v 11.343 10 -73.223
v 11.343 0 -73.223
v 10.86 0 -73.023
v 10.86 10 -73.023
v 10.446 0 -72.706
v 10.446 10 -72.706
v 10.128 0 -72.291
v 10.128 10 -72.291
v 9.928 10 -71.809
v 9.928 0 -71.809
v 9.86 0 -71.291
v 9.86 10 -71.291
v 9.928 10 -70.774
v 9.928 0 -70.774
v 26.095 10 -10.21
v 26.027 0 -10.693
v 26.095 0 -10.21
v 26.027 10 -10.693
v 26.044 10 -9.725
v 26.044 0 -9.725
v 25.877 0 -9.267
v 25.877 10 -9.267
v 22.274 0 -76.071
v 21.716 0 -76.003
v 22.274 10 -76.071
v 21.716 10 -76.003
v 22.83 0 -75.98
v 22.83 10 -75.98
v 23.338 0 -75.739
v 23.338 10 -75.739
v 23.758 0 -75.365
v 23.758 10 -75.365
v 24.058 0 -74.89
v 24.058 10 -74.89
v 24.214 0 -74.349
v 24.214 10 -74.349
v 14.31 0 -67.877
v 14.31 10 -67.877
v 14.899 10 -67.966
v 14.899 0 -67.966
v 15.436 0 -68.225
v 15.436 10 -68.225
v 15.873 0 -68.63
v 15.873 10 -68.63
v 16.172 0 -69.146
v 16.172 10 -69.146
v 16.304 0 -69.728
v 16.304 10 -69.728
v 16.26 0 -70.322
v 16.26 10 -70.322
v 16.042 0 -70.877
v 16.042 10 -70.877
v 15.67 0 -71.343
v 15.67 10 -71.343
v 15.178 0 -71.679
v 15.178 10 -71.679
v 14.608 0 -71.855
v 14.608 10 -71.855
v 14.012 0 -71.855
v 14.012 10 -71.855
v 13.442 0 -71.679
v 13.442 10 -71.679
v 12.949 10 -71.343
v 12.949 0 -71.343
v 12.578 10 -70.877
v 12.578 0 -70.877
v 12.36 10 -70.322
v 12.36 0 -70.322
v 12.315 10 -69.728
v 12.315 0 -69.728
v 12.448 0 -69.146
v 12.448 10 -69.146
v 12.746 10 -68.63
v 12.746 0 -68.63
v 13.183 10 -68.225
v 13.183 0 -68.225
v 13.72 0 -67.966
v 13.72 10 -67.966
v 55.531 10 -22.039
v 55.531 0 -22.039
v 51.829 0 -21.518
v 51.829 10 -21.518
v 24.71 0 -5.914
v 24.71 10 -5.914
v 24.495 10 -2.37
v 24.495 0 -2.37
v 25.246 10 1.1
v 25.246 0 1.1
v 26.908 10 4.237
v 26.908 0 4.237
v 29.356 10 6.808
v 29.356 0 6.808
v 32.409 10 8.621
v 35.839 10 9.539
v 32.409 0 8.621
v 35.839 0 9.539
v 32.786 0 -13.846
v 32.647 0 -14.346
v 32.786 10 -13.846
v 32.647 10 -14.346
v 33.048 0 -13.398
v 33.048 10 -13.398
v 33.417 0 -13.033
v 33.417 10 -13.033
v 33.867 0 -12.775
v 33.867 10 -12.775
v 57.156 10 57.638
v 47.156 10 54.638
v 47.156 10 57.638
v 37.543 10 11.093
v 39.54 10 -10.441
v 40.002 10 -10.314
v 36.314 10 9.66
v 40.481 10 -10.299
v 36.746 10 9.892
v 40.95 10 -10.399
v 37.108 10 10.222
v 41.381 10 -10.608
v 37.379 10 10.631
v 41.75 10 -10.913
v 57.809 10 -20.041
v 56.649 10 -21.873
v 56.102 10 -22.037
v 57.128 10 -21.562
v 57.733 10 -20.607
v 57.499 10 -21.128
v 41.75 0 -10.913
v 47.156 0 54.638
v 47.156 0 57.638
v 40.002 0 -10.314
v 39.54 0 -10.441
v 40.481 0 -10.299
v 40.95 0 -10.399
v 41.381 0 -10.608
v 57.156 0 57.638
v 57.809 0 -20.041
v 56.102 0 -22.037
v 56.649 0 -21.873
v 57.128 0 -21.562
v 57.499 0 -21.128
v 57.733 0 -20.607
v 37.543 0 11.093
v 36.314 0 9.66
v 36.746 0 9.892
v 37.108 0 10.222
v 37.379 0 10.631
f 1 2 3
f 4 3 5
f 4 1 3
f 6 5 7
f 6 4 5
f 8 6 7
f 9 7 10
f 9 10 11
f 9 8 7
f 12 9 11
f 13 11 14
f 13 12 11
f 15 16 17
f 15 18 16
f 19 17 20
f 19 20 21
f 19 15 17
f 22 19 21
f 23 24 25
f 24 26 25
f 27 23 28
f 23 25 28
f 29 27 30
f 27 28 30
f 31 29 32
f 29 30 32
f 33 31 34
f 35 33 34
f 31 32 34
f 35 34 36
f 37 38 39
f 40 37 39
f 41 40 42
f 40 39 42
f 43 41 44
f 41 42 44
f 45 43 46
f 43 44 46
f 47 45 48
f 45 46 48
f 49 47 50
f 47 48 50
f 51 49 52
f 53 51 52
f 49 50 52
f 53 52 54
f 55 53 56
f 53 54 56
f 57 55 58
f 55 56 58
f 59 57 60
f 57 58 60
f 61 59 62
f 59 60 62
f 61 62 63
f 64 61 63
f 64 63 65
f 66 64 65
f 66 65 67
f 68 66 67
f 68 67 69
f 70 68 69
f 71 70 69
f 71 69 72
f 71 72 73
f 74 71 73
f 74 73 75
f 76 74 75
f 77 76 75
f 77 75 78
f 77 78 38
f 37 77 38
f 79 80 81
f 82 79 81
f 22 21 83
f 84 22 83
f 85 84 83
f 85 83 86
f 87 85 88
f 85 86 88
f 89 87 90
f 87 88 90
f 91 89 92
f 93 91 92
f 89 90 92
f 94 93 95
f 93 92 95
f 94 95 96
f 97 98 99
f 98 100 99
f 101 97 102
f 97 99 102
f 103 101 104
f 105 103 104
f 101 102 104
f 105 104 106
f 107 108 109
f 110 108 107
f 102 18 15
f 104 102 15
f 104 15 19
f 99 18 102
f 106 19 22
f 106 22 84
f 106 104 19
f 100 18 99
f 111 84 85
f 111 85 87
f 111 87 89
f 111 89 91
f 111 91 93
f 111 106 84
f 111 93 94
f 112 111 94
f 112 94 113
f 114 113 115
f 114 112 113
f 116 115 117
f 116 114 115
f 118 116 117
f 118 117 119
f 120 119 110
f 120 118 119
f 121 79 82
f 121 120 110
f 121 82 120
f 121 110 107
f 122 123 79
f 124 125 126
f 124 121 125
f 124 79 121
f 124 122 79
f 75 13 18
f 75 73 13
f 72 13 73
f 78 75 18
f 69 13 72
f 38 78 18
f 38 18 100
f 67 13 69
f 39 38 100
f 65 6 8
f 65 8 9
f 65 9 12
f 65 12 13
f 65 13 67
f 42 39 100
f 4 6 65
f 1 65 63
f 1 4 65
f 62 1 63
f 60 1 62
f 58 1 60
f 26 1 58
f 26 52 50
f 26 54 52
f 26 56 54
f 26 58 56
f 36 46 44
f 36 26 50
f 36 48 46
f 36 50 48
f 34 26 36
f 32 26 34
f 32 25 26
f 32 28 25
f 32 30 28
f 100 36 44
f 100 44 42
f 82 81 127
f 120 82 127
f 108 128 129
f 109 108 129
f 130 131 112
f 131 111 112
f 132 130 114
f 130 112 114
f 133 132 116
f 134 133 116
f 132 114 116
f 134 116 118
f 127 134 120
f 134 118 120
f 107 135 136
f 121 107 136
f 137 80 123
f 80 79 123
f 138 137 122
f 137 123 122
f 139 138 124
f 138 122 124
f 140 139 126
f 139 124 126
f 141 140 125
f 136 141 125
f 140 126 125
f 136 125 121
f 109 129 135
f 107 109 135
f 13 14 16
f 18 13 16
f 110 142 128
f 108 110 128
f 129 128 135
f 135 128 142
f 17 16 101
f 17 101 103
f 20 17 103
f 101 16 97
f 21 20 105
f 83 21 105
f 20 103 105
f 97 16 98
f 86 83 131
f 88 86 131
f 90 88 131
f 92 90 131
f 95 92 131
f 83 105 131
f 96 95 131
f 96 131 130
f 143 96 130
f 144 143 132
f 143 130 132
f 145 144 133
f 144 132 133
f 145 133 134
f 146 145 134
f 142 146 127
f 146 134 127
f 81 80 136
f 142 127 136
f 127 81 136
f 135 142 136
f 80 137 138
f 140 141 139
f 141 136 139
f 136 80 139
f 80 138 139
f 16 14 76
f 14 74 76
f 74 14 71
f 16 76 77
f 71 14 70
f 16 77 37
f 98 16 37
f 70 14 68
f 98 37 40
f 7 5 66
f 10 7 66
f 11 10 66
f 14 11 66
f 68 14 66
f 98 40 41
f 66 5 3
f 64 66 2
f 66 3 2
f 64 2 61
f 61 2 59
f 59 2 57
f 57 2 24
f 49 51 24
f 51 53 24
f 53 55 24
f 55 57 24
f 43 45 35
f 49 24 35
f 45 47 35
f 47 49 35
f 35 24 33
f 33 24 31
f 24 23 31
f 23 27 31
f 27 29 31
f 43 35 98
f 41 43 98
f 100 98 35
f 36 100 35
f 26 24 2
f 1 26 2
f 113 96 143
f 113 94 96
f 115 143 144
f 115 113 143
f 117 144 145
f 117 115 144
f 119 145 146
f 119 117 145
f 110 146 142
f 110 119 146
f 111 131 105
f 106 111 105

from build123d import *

# Parameters (mm, degrees)
BOSS_EXTRUDE1_DEPTH = 10
SKETCH2_R           = 2
CUT_EXTRUDE1_DEPTH  = 97.487793931
FILLET1_R           = 2


with BuildPart() as part:
    # Sketch1 → Boss-Extrude1 (new body)
    with BuildSketch(Plane(origin=(0, 0, 0), x_dir=(1, 0, 0), z_dir=(0, 1, 0))):
        with BuildLine():
            Line((23.899700969, 76.587880496), (9.410813575, 72.70559482))
            Line((9.410813575, 72.70559482), (26.234051507, 9.920416111))
            ThreePointArc((26.234051507, 9.920416111), (26.122890324, -3.007620786), (37.221477465, -9.638447153))
            Line((37.221477465, -9.638447153), (47.155900716, -54.638447153))
            Line((47.155900716, -54.638447153), (47.155900716, -57.638447153))
            Line((47.155900716, -57.638447153), (57.155900716, -57.638447153))
            Line((57.155900716, -57.638447153), (57.828980094, 22.361552847))
            Line((57.828980094, 22.361552847), (51.828980094, 21.518307839))
            Line((51.828980094, 21.518307839), (40.806779431, 9.920416111))
            Line((40.806779431, 9.920416111), (32.806779431, 13.210724097))
            Line((32.806779431, 13.210724097), (23.899700969, 76.587880496))
        make_face()
    extrude(amount=BOSS_EXTRUDE1_DEPTH)

    # Sketch2 → Cut-Extrude1 (cut, through all)
    with BuildSketch(Plane(origin=(0, 10, 0), x_dir=(1, 0, 0), z_dir=(0, 1, 0))):
        with Locations(Location((14.309793061, 69.877167695, 0), (0, 0, 270))):
            Circle(SKETCH2_R)
    extrude(amount=-CUT_EXTRUDE1_DEPTH, mode=Mode.SUBTRACT)

    # Fillet1
    fillet1_edges = [part.edges().sort_by_distance(p)[0] for p in [
        (37.221477465, 5, 9.638447153),
        (26.234051507, 5, -9.920416111),
        (9.410813575, 5, -72.70559482),
        (23.899700969, 5, -76.587880496),
        (32.806779431, 5, -13.210724097),
        (40.806779431, 5, -9.920416111),
        (57.828980094, 5, -22.361552847),
    ]]
    fillet(fillet1_edges, radius=FILLET1_R)


solid = part.part
